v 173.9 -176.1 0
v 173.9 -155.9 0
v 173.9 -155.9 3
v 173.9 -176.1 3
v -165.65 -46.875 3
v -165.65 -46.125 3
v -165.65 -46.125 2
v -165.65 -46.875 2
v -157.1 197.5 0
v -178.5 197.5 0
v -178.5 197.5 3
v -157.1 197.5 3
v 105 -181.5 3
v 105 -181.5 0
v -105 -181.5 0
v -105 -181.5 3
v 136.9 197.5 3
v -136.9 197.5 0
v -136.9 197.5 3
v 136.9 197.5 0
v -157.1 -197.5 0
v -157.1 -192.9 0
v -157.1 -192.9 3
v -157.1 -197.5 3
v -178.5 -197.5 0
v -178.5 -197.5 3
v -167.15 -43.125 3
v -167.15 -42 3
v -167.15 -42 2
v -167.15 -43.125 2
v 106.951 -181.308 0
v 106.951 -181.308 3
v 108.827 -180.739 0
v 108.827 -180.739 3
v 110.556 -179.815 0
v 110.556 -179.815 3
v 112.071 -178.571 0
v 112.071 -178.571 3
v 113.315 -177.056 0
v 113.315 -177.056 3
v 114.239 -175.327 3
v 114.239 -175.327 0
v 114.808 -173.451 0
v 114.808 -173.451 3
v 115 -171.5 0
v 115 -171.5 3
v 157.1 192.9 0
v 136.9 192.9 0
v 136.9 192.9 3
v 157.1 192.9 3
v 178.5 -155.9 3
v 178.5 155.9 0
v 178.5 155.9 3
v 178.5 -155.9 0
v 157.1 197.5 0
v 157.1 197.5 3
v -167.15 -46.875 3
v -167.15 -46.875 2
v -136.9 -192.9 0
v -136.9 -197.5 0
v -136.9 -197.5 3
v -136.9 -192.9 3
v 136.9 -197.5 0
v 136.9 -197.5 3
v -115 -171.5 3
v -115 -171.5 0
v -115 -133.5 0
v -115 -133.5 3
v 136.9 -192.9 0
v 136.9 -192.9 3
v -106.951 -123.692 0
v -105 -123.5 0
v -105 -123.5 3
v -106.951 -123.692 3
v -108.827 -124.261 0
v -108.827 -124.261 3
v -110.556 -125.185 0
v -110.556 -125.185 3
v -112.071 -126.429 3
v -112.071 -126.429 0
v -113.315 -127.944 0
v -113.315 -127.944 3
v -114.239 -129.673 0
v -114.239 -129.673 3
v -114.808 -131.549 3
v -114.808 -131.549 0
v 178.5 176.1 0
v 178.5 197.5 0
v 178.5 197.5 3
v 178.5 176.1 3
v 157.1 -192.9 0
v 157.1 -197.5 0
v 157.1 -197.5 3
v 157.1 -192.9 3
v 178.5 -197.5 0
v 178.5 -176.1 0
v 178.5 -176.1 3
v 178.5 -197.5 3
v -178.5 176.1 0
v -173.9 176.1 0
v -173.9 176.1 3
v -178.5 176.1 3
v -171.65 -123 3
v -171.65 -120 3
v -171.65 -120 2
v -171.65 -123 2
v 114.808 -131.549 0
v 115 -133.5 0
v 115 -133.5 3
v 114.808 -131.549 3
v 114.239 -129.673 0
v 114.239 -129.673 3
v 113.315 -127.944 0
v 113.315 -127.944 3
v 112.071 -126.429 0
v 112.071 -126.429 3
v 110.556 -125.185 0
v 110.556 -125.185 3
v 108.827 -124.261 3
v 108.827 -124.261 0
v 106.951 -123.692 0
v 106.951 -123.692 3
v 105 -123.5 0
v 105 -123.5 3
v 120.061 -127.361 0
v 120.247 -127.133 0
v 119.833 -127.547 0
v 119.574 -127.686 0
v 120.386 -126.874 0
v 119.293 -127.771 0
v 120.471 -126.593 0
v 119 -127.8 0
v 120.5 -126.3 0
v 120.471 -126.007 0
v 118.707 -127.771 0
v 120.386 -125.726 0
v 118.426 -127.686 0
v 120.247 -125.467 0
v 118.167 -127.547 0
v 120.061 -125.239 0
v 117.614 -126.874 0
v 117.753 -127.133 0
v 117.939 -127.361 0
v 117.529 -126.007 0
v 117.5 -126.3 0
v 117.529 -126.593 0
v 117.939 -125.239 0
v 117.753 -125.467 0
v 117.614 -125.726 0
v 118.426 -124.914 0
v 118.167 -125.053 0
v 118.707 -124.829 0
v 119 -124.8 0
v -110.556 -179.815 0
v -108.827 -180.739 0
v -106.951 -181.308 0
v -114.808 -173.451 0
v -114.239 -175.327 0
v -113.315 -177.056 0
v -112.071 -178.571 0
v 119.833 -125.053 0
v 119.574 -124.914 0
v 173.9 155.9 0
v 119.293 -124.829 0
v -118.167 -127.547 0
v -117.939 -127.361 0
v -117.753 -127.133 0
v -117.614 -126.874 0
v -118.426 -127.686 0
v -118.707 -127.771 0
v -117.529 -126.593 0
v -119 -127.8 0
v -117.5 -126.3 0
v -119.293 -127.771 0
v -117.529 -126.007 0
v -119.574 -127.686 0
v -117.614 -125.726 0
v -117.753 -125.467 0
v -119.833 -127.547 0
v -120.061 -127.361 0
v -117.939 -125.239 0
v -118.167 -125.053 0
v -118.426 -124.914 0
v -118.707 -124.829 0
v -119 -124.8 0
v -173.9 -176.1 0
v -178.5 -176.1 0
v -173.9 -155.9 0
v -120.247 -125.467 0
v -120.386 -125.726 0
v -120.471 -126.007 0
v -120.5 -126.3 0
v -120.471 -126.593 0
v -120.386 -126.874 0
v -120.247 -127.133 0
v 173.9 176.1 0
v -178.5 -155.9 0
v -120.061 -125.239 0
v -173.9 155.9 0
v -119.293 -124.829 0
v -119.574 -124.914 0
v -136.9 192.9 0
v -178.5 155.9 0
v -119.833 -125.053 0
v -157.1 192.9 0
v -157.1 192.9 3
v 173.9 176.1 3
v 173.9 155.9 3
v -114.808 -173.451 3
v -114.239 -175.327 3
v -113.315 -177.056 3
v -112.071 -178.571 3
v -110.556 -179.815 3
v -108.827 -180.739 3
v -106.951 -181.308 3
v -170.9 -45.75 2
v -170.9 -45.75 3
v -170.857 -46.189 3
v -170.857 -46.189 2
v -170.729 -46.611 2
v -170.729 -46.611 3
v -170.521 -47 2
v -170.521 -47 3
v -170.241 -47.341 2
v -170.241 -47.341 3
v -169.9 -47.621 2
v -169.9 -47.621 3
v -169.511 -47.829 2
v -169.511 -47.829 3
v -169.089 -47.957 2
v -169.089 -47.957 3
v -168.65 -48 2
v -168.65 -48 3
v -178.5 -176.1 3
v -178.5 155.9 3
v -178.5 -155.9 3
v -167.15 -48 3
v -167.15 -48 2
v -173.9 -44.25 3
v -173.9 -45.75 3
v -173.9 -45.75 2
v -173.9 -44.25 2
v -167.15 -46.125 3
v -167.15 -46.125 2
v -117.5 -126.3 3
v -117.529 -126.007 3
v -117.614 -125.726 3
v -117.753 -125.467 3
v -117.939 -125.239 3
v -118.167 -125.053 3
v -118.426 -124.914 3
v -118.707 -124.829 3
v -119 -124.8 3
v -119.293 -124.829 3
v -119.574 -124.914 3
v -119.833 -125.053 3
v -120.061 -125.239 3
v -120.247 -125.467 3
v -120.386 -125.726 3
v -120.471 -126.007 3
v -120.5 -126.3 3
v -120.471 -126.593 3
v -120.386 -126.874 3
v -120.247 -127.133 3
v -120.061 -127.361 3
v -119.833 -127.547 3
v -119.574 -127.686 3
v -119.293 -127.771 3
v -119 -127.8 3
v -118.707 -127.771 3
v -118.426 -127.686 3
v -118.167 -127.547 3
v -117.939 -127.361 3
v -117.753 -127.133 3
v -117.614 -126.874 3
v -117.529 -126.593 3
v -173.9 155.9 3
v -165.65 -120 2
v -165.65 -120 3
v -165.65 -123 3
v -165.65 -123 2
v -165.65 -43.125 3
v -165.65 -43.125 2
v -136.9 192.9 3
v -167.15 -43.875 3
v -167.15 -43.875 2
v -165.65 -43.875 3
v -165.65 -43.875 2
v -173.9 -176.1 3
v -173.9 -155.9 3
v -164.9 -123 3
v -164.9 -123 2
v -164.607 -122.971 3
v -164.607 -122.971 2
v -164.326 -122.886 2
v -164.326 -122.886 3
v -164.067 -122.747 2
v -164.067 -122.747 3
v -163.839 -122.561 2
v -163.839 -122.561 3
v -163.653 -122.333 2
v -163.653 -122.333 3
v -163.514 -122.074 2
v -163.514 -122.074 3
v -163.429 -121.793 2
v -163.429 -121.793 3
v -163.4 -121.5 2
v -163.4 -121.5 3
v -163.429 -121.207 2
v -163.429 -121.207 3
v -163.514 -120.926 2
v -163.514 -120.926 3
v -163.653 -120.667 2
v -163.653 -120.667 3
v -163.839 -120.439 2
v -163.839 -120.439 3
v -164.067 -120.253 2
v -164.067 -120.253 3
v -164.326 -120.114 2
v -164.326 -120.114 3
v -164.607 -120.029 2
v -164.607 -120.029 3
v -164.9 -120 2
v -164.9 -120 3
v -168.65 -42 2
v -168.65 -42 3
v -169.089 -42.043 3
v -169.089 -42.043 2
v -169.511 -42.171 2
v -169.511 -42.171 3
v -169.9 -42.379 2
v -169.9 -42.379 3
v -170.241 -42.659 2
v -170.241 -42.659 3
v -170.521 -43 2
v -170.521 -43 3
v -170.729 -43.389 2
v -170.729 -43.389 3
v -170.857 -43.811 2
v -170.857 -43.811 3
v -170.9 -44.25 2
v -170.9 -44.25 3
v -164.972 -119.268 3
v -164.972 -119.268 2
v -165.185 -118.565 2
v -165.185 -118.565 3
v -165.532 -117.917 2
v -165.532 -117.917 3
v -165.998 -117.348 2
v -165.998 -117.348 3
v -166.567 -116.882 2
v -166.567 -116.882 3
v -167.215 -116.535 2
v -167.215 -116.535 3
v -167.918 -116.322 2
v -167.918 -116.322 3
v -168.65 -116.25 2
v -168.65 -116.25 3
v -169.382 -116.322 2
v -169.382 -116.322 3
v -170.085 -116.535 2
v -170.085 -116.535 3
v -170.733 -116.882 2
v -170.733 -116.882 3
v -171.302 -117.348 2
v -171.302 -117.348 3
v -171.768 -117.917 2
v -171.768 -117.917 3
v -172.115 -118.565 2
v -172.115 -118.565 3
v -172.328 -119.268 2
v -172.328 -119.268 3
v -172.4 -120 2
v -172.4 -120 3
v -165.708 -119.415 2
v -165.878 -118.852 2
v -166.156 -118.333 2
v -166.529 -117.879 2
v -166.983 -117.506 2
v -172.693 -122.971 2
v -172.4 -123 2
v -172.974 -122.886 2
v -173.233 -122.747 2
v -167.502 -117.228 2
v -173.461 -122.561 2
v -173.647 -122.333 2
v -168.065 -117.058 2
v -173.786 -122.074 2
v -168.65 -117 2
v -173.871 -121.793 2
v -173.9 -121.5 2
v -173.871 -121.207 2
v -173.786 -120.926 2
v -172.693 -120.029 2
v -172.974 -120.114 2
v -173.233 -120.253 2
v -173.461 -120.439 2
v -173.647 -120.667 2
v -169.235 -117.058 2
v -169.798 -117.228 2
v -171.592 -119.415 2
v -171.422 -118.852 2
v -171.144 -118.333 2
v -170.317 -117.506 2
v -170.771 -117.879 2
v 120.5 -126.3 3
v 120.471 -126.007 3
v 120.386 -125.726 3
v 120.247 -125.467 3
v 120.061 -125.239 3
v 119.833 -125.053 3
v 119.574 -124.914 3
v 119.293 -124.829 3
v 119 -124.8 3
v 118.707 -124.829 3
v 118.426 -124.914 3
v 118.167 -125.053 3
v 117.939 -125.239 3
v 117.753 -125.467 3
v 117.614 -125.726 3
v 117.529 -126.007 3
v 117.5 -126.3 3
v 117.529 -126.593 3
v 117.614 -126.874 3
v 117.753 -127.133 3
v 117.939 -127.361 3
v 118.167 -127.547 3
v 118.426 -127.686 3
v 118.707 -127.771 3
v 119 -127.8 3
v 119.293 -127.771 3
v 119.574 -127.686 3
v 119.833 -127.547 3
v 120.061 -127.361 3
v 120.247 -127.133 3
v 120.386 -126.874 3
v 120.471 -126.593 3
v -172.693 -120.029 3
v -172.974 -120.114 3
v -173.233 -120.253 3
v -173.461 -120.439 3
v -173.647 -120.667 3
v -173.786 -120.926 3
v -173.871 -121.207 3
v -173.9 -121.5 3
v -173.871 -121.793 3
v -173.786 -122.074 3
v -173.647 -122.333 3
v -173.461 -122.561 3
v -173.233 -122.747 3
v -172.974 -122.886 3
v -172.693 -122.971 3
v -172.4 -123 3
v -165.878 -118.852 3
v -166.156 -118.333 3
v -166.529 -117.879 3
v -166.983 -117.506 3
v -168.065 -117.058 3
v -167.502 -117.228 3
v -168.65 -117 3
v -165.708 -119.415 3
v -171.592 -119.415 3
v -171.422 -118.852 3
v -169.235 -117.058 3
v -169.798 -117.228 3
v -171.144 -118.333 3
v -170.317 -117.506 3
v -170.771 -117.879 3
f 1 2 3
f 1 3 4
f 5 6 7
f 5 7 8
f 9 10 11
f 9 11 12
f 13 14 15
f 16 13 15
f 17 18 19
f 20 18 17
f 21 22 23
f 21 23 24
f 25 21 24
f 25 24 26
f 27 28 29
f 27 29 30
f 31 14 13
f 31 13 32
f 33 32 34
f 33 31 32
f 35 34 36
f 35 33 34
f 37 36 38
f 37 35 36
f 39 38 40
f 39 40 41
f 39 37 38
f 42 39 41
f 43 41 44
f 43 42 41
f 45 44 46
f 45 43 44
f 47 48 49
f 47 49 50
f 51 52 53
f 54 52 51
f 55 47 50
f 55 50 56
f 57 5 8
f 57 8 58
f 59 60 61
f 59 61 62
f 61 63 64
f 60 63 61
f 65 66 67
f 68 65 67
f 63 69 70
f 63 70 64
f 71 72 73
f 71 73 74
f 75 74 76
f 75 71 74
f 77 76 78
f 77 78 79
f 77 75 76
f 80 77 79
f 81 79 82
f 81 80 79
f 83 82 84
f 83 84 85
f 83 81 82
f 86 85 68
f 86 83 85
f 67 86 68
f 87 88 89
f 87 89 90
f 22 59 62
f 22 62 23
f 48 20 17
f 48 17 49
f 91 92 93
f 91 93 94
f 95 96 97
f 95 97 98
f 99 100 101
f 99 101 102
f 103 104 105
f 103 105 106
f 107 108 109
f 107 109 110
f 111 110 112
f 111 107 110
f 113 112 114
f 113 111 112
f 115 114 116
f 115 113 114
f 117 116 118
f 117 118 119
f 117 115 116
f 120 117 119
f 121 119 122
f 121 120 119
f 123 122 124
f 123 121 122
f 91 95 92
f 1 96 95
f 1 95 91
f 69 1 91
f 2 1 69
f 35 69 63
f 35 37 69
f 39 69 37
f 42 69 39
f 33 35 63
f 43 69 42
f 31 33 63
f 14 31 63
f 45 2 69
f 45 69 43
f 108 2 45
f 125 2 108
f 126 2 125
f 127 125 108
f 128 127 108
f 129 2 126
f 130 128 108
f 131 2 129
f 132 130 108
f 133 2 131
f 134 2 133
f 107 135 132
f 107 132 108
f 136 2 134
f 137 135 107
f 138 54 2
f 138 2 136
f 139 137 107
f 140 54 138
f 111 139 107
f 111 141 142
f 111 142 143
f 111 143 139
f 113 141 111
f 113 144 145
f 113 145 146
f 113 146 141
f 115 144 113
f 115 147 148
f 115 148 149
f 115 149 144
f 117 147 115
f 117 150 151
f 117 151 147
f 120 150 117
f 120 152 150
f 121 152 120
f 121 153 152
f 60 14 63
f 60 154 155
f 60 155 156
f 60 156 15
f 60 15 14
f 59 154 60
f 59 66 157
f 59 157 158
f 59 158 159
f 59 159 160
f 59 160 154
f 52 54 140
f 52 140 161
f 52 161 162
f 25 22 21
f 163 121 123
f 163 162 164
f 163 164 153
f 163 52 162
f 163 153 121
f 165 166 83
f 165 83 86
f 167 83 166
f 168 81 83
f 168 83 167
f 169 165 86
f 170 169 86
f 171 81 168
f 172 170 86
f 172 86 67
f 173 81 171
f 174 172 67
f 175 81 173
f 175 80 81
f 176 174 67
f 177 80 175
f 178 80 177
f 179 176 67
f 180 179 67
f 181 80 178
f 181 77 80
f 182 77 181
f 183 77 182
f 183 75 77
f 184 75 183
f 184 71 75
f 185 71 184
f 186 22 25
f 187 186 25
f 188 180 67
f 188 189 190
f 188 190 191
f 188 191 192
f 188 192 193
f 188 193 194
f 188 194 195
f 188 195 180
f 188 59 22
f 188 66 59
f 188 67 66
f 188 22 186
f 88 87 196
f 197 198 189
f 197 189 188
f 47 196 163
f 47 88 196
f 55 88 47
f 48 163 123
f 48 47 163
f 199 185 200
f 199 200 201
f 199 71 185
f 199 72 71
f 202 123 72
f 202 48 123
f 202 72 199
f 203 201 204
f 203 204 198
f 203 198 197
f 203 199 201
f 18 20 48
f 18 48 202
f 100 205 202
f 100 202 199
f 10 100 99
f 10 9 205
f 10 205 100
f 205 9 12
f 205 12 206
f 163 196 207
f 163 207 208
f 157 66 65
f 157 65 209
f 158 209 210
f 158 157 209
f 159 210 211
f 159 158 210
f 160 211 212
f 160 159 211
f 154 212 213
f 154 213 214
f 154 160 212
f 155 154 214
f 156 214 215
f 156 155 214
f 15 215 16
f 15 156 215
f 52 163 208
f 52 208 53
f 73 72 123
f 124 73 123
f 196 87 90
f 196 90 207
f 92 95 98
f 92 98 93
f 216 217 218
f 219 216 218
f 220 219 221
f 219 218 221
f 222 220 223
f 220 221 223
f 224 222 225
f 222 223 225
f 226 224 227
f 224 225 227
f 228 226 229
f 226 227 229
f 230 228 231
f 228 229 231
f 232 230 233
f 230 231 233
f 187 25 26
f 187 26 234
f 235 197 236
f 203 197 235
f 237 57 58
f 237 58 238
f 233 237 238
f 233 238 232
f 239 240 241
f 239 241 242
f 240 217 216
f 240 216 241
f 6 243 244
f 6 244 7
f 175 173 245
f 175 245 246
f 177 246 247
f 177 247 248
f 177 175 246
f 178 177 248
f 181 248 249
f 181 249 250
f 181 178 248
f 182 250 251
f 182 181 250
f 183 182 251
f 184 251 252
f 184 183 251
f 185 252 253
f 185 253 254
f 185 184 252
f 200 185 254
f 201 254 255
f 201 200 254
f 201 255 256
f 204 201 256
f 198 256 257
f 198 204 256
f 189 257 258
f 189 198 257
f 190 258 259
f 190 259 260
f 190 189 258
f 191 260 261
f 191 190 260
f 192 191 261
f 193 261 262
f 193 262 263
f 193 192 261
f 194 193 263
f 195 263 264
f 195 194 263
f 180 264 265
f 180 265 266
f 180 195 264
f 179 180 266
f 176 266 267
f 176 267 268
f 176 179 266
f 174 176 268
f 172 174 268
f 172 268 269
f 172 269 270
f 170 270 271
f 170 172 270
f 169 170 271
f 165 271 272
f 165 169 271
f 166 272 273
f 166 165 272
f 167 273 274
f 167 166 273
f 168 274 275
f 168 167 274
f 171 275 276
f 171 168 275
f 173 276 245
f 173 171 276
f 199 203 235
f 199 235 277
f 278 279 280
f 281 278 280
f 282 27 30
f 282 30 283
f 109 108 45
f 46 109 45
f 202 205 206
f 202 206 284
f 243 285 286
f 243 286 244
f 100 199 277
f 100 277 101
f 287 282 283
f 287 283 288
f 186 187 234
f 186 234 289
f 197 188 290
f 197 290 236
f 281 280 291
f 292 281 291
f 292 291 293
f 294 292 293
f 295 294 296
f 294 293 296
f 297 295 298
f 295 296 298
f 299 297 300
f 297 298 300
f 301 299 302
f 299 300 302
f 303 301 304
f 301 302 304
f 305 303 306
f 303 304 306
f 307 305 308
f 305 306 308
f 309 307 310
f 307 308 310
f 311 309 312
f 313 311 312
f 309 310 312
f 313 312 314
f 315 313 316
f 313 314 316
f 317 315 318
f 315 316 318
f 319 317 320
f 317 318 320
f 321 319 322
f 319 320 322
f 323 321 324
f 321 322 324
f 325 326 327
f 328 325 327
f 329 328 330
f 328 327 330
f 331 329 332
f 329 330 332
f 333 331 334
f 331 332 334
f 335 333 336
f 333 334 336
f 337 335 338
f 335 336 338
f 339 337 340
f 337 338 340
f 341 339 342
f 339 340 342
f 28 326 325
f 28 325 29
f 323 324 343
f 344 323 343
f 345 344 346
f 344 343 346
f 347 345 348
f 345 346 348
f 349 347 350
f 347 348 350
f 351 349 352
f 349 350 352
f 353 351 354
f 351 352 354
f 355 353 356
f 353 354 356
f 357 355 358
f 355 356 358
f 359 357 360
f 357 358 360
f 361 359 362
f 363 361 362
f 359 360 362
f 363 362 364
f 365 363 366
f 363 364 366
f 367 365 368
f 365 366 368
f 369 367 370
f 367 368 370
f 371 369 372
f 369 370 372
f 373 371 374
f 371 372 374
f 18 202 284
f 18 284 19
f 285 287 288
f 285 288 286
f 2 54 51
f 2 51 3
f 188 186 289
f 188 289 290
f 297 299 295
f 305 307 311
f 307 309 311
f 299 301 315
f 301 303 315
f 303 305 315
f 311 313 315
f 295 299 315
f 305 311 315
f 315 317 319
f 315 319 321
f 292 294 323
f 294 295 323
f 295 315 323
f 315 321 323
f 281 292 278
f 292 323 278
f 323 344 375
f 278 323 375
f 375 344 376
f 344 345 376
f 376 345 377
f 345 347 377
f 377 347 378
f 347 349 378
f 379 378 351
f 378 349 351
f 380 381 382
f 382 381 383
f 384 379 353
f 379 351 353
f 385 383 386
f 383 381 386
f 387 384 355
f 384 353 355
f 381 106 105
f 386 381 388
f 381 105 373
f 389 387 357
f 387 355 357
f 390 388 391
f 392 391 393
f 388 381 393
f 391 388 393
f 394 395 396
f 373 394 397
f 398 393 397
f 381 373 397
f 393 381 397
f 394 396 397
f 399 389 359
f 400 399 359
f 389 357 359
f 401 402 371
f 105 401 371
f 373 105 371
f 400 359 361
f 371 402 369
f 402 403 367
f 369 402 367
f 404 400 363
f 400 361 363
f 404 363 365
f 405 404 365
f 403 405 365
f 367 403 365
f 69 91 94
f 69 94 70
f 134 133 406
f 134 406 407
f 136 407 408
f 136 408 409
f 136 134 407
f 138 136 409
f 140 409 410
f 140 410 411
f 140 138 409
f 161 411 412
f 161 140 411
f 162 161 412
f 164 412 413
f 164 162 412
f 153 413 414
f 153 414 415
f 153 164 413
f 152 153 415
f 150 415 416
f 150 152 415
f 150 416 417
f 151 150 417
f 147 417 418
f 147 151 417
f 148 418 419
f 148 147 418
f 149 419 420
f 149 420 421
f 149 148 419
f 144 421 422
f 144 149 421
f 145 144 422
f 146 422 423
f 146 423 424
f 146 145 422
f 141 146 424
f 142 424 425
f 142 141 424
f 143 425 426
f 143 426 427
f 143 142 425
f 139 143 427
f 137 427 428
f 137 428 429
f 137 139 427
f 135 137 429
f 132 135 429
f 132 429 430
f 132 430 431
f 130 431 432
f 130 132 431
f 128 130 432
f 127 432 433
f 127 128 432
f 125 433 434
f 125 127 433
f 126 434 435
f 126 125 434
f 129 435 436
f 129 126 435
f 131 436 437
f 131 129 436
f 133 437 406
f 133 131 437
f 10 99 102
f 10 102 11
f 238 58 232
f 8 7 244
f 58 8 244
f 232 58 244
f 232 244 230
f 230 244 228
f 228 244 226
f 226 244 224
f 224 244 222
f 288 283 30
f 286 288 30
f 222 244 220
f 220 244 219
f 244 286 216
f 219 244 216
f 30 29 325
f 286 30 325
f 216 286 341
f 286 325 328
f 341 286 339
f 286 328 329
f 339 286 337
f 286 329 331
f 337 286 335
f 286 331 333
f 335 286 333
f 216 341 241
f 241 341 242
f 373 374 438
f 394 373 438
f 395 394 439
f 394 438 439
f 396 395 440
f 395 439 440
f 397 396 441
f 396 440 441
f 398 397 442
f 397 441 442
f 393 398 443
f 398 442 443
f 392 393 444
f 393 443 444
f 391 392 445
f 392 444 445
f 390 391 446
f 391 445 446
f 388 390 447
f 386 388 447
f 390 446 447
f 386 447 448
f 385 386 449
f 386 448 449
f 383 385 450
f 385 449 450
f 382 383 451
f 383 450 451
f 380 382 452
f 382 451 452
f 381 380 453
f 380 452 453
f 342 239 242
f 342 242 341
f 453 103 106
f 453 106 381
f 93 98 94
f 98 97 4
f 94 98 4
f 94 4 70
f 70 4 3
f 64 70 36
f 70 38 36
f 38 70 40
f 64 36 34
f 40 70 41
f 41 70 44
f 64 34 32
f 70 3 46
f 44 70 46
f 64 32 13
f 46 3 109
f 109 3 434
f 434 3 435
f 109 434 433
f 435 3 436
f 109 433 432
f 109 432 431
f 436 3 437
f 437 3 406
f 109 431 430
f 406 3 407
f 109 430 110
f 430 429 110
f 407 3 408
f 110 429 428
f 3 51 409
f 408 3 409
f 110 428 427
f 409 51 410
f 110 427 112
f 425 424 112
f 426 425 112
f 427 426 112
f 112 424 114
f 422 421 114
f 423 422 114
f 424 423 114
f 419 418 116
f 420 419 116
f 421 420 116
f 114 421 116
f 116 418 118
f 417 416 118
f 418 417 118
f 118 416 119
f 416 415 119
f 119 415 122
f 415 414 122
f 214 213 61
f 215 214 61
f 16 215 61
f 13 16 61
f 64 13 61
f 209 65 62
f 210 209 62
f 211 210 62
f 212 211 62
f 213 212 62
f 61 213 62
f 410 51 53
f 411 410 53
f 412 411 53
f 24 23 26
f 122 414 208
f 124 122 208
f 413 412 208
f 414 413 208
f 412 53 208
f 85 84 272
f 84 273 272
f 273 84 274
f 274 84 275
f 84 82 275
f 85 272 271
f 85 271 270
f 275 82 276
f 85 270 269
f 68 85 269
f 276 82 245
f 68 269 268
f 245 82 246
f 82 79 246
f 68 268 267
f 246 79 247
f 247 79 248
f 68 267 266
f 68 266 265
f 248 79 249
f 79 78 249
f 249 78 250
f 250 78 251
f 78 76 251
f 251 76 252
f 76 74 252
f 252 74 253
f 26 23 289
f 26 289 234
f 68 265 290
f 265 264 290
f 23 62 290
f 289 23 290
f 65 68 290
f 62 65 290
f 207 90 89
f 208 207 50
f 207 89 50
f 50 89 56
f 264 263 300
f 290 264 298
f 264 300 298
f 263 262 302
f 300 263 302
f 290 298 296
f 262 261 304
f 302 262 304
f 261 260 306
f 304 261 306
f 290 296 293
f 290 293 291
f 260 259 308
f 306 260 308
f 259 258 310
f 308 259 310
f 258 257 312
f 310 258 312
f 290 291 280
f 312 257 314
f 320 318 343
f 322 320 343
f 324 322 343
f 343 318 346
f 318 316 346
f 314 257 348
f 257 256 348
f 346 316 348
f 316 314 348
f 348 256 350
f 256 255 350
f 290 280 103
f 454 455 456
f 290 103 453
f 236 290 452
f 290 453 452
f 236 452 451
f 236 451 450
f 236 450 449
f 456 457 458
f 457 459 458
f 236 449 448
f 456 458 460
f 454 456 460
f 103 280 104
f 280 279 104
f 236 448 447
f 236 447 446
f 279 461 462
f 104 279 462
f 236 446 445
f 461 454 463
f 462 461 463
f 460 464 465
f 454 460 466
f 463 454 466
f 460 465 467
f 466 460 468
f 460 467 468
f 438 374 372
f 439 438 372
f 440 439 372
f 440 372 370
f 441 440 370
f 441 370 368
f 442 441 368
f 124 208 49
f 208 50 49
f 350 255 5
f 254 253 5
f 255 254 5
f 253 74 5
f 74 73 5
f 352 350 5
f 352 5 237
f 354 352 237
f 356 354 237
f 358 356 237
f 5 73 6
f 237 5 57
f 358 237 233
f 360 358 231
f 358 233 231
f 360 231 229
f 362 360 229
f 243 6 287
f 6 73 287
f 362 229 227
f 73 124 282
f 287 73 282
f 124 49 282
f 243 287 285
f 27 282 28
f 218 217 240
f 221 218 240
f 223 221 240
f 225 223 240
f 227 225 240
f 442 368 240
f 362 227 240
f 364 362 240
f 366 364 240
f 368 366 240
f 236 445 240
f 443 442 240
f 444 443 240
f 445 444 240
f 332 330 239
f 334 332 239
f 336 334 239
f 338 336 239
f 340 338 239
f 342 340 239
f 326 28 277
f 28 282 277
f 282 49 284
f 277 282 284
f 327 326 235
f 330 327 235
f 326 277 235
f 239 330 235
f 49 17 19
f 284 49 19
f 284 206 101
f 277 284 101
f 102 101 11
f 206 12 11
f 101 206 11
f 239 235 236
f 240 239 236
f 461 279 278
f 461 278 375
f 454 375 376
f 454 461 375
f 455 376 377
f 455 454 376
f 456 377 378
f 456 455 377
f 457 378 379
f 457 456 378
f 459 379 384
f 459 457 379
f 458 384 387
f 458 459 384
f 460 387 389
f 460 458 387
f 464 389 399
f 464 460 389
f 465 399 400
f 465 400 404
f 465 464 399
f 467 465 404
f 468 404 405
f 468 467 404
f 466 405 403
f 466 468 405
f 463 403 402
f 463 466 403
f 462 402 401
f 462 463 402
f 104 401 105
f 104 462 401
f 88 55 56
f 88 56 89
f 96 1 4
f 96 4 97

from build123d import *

# Parameters (mm, degrees)
SKETCH_R     = 1.5
PAD_DEPTH    = 3
POCKET_DEPTH = 1


with BuildPart() as part:
    # Sketch → Pad (new body)
    with BuildSketch(Plane.XY):
        Polygon((-173.9, 176.1), (-178.5, 176.1), (-178.5, 197.5), (-157.1, 197.5), (-157.1, 192.9), (-136.9, 192.9), (-136.9, 197.5), (136.9, 197.5), (136.9, 192.9), (157.1, 192.9), (157.1, 197.5), (178.5, 197.5), (178.5, 176.1), (173.9, 176.1), (173.9, 155.9), (178.5, 155.9), (178.5, -155.9), (173.9, -155.9), (173.9, -176.1), (178.5, -176.1), (178.5, -197.5), (157.1, -197.5), (157.1, -192.9), (136.9, -192.9), (136.9, -197.5), (-136.9, -197.5), (-136.9, -192.9), (-157.1, -192.9), (-157.1, -197.5), (-178.5, -197.5), (-178.5, -176.1), (-173.9, -176.1), (-173.9, -155.9), (-178.5, -155.9), (-178.5, 155.9), (-173.9, 155.9), align=None)
        with Locations((-119, -126.3)):
            Circle(SKETCH_R, mode=Mode.SUBTRACT)
        with Locations((119, -126.3)):
            Circle(SKETCH_R, mode=Mode.SUBTRACT)
        with BuildLine():
            Line((-105, -123.5), (105, -123.5))
            ThreePointArc((115, -133.5), (112.071068, -126.428932), (105, -123.5))
            Line((115, -133.5), (115, -171.5))
            ThreePointArc((105, -181.5), (112.071068, -178.571068), (115, -171.5))
            Line((105, -181.5), (-105, -181.5))
            ThreePointArc((-115, -171.5), (-112.071068, -178.571068), (-105, -181.5))
            Line((-115, -171.5), (-115, -133.5))
            ThreePointArc((-105, -123.5), (-112.071068, -126.428932), (-115, -133.5))
        make_face(mode=Mode.SUBTRACT)
    extrude(amount=PAD_DEPTH)

    # Sketch001 (on Face48 of Pad) → Pocket (cut)
    with BuildSketch(Plane.XY.offset(3)):
        with BuildLine():
            Line((-170.9, -45.75), (-173.9, -45.75))
            Line((-173.9, -45.75), (-173.9, -44.25))
            Line((-173.9, -44.25), (-170.9, -44.25))
            ThreePointArc((-168.650001, -42.00001), (-170.240987, -42.659016), (-170.9, -44.25))
            Line((-168.650001, -42.00001), (-167.150001, -42.00001))
            Line((-167.150001, -42.00001), (-167.150001, -43.12501))
            Line((-167.150001, -43.12501), (-165.650001, -43.12501))
            Line((-165.650001, -43.12501), (-165.650001, -43.87501))
            Line((-165.650001, -43.87501), (-167.150001, -43.87501))
            Line((-167.150001, -43.87501), (-167.150001, -46.12501))
            Line((-167.150001, -46.12501), (-165.650001, -46.12501))
            Line((-165.650001, -46.12501), (-165.650001, -46.87501))
            Line((-165.650001, -46.87501), (-167.150001, -46.87501))
            Line((-167.150001, -46.87501), (-167.150001, -48.00001))
            Line((-167.150001, -48.00001), (-168.650001, -48.00001))
            ThreePointArc((-170.9, -45.75), (-170.240994, -47.340997), (-168.650001, -48.00001))
        make_face()
        with BuildLine():
            ThreePointArc((-165.65, -120), (-168.65, -117), (-171.65, -120))
            Line((-171.65, -120), (-171.65, -123))
            Line((-171.65, -123), (-172.4, -123))
            ThreePointArc((-172.4, -120), (-173.9, -121.5), (-172.4, -123))
            ThreePointArc((-164.9, -120), (-168.65, -116.25), (-172.4, -120))
            ThreePointArc((-164.9, -123), (-163.4, -121.5), (-164.9, -120))
            Line((-165.65, -123), (-164.9, -123))
            Line((-165.65, -120), (-165.65, -123))
        make_face()
    extrude(amount=-POCKET_DEPTH, mode=Mode.SUBTRACT)


solid = part.part
